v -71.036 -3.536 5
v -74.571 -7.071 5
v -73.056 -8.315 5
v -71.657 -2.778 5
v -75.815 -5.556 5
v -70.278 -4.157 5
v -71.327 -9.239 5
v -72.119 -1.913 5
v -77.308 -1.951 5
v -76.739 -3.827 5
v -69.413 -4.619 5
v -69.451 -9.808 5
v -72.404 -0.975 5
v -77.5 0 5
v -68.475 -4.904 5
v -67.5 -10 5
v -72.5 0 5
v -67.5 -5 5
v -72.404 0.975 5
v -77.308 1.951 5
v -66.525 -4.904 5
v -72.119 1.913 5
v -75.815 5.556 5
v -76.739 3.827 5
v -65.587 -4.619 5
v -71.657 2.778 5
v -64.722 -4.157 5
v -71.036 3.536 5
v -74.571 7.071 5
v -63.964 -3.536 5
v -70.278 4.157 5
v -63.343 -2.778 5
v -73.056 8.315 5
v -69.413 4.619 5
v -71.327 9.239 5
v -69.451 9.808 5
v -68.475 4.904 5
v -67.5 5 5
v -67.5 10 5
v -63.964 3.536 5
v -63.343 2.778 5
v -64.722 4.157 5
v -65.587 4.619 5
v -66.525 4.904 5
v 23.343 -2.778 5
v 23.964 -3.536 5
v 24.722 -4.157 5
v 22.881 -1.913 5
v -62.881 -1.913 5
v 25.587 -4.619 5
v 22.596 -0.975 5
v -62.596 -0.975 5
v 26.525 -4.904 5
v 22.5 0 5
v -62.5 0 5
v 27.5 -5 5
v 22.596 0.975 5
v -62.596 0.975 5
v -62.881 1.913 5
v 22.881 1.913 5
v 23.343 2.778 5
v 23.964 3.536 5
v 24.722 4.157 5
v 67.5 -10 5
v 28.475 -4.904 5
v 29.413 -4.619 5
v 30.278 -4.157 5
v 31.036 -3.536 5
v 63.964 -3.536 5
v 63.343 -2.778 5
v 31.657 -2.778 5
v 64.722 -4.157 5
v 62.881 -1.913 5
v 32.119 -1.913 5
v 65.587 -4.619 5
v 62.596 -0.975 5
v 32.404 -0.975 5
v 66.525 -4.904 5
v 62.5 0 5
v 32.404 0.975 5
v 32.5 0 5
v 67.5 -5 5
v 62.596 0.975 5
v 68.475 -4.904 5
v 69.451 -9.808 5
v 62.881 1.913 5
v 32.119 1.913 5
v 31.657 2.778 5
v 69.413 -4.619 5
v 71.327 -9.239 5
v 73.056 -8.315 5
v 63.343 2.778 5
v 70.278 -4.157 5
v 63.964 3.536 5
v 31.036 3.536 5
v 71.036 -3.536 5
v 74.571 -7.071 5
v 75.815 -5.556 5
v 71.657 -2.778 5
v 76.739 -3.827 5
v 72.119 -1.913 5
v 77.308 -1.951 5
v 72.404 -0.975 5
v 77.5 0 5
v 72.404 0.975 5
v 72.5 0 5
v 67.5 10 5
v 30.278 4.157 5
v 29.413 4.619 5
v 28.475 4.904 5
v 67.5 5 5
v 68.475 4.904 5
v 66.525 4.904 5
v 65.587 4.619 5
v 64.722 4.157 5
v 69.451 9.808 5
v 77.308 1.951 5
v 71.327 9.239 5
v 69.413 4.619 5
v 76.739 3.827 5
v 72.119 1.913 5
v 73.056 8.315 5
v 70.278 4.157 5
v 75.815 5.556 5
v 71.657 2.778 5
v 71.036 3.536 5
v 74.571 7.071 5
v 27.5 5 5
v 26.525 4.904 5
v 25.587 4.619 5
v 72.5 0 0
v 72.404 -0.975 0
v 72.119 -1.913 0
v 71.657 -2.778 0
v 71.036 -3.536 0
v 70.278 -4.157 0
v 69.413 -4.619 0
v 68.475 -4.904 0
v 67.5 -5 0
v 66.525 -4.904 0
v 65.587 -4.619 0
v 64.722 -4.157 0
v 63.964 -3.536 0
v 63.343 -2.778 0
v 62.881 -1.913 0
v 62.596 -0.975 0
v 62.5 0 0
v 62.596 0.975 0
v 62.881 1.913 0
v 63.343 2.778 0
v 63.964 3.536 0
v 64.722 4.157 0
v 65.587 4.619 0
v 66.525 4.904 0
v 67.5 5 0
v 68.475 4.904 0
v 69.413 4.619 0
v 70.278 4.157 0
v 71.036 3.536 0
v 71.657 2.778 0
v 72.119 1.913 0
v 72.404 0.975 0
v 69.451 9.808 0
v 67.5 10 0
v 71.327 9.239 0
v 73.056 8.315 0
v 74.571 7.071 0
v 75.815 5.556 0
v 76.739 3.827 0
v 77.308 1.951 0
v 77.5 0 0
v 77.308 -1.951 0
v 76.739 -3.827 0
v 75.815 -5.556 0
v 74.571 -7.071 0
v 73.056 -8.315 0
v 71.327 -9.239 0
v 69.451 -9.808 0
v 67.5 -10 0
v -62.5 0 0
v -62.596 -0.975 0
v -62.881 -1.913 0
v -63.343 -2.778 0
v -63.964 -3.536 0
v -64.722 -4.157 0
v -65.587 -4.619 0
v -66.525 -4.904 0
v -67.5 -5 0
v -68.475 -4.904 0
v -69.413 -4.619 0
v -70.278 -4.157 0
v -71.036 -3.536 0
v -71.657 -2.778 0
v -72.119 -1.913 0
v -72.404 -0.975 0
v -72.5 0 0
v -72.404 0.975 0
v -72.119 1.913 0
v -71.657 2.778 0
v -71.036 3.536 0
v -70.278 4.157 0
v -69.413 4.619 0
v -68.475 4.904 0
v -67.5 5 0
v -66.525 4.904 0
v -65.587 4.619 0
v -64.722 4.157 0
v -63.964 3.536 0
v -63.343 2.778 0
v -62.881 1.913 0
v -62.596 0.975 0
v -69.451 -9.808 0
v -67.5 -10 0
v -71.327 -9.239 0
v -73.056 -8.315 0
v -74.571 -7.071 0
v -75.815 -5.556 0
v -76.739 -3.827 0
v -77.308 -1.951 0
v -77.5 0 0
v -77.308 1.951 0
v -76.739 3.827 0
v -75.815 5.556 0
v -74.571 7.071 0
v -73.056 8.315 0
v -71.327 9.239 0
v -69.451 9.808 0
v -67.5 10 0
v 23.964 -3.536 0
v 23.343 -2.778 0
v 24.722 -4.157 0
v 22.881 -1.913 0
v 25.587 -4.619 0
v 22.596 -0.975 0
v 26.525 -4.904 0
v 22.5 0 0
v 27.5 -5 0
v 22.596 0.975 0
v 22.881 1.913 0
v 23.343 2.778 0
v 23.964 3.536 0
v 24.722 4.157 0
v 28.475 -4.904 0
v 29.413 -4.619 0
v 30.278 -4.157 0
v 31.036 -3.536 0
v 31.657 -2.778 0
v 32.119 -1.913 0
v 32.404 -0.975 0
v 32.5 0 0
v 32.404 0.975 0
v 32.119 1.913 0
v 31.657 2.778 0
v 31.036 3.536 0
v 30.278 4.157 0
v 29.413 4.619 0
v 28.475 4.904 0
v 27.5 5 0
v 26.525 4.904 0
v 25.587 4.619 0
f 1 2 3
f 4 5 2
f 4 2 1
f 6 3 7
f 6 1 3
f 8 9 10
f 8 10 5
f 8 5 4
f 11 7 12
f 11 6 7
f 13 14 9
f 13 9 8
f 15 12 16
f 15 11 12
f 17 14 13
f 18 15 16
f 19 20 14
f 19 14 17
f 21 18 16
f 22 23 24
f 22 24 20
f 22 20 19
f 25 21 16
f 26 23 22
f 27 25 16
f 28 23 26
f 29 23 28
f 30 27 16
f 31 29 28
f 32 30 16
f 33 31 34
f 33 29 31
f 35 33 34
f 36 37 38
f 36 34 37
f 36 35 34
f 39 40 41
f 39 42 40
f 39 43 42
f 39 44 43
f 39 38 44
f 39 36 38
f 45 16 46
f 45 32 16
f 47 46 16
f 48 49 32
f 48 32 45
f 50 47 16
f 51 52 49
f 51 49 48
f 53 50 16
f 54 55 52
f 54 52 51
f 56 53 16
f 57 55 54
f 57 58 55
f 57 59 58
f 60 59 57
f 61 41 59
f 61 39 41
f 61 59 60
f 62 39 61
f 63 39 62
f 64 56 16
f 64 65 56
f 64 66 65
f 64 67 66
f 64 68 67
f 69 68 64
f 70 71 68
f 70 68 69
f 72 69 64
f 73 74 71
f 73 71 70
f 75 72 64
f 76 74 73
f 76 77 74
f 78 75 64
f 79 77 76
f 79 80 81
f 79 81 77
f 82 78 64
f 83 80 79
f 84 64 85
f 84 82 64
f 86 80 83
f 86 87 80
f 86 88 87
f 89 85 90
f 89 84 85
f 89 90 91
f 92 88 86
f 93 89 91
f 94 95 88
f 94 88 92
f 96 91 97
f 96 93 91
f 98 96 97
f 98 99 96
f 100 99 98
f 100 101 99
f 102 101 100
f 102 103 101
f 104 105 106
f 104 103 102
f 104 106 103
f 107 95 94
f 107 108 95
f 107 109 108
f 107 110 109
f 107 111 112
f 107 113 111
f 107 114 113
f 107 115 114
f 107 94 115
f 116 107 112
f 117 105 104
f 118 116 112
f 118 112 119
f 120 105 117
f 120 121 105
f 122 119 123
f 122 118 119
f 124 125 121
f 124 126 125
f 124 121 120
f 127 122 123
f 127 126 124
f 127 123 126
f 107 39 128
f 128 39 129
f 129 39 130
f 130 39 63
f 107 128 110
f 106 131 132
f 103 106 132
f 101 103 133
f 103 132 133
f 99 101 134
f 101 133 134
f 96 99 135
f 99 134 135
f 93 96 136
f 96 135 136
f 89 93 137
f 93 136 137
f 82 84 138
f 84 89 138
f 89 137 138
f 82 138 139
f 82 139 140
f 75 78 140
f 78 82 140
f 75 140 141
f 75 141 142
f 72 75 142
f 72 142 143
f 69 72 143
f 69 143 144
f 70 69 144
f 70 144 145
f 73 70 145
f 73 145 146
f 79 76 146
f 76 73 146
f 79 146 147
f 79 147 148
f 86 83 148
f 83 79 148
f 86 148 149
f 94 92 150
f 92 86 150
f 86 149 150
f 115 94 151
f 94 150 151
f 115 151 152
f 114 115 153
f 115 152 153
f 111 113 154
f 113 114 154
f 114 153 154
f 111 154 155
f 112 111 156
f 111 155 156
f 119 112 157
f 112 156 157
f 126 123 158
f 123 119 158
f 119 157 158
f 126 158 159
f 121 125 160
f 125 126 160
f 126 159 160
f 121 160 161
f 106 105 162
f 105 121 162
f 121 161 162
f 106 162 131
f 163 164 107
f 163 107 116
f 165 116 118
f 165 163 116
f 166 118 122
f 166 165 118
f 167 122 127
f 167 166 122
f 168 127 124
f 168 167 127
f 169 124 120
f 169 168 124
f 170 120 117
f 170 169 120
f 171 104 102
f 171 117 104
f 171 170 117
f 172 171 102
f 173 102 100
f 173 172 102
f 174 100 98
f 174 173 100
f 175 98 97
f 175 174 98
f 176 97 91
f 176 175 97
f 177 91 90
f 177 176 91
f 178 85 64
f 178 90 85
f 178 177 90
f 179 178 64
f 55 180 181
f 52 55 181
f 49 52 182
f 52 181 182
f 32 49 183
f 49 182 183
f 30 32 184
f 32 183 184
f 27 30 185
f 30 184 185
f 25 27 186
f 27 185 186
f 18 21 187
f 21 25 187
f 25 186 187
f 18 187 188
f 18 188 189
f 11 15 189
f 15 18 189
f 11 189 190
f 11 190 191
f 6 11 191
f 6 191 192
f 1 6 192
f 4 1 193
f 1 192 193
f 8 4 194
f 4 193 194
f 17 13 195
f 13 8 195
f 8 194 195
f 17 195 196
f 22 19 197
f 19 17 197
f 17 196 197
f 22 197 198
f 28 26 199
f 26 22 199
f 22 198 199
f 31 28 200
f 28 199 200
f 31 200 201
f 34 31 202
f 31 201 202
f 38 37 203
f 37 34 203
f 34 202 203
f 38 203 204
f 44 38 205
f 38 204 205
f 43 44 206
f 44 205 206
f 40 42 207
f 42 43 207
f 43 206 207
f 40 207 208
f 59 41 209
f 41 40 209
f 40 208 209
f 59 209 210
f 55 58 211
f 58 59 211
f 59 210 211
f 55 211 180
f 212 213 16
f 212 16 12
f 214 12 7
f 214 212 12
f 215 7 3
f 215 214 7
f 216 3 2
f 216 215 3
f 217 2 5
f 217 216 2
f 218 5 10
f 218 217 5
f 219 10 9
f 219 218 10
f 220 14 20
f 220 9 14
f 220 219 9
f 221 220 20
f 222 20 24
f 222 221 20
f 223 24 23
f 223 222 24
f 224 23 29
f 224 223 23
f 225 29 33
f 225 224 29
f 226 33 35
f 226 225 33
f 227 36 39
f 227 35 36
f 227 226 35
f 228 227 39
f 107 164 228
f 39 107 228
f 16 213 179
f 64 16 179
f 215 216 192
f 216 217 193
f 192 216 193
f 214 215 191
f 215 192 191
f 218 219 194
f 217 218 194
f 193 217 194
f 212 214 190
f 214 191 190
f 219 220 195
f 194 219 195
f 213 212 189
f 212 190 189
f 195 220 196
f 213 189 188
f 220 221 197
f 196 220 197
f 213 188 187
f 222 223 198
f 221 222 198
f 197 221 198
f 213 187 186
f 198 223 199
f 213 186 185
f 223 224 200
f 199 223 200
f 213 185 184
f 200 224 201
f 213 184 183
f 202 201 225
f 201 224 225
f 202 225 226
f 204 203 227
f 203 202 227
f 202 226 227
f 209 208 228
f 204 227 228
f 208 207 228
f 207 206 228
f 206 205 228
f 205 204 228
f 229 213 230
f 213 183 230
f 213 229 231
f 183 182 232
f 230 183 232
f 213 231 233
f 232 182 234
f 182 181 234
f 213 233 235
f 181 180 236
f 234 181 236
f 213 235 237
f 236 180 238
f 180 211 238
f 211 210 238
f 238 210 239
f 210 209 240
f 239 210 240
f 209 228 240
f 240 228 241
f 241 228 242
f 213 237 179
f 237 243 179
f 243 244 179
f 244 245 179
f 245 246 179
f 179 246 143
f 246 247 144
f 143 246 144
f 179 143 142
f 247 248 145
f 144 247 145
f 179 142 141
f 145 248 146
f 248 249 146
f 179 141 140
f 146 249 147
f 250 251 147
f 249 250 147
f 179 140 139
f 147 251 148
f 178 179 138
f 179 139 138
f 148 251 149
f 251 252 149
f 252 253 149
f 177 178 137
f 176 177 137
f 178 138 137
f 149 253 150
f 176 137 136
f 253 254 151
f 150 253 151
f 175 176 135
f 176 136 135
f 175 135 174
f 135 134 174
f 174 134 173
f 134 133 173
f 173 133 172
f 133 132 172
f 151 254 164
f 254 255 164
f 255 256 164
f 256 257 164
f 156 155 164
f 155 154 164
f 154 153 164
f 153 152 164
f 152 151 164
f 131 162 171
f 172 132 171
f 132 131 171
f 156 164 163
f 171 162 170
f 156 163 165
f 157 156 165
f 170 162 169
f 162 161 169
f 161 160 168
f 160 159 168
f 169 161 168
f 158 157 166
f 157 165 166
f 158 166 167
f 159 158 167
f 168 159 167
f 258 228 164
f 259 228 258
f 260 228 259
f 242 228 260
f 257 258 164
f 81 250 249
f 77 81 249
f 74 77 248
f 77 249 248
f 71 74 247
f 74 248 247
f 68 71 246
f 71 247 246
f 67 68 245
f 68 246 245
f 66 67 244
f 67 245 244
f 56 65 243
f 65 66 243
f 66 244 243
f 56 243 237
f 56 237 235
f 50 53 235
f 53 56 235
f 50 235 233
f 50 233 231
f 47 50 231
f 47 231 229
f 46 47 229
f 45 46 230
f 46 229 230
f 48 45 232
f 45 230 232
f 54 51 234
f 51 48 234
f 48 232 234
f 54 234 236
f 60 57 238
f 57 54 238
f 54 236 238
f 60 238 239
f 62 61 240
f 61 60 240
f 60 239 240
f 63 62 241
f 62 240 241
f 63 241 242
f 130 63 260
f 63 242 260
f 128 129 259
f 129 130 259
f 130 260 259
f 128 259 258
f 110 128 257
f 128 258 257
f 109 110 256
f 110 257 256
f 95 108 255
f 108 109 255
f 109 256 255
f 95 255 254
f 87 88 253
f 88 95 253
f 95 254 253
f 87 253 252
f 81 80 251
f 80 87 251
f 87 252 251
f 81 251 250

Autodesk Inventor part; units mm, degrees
ref_plane "YZ Plane" through (0, 0, 0) normal (1, 0, 0) x (0, 1, 0)
ref_plane "XZ Plane" through (0, 0, 0) normal (0, 1, 0) x (-1, 0, 0)
ref_plane "XY Plane" through (0, 0, 0) normal (0, 0, 1) x (1, 0, 0)
sketch "스케치1" plane through (0, 0, 0) normal (0, 0, 1) x (1, 0, 0)
  line L0 (-67.5, 0) -> (67.5, 0) construction
  line L1 (-67.5, -10) -> (67.5, -10)
  line L2 (67.5, 10) -> (-67.5, 10)
  arc A0 (-67.5, 10) -> (-67.5, -10) centre (-67.5, 0) ccw
  arc A1 (67.5, -10) -> (67.5, 10) centre (67.5, 0) ccw
  circle A2 centre (-67.5, 0) radius 5
  circle A3 centre (67.5, 0) radius 5
  circle A4 centre (27.5, 0) radius 5
  point P0 (0, 0)
  dimension "d1" = 20
  dimension "d2" = 10
  dimension "d3" = 10
  dimension "d7" = 10
  dimension "d8" = 40
  dimension "d9" = 95
extrude "돌출1" add sketch "스케치1" along normal blind 5
properties part number "link_l1"
